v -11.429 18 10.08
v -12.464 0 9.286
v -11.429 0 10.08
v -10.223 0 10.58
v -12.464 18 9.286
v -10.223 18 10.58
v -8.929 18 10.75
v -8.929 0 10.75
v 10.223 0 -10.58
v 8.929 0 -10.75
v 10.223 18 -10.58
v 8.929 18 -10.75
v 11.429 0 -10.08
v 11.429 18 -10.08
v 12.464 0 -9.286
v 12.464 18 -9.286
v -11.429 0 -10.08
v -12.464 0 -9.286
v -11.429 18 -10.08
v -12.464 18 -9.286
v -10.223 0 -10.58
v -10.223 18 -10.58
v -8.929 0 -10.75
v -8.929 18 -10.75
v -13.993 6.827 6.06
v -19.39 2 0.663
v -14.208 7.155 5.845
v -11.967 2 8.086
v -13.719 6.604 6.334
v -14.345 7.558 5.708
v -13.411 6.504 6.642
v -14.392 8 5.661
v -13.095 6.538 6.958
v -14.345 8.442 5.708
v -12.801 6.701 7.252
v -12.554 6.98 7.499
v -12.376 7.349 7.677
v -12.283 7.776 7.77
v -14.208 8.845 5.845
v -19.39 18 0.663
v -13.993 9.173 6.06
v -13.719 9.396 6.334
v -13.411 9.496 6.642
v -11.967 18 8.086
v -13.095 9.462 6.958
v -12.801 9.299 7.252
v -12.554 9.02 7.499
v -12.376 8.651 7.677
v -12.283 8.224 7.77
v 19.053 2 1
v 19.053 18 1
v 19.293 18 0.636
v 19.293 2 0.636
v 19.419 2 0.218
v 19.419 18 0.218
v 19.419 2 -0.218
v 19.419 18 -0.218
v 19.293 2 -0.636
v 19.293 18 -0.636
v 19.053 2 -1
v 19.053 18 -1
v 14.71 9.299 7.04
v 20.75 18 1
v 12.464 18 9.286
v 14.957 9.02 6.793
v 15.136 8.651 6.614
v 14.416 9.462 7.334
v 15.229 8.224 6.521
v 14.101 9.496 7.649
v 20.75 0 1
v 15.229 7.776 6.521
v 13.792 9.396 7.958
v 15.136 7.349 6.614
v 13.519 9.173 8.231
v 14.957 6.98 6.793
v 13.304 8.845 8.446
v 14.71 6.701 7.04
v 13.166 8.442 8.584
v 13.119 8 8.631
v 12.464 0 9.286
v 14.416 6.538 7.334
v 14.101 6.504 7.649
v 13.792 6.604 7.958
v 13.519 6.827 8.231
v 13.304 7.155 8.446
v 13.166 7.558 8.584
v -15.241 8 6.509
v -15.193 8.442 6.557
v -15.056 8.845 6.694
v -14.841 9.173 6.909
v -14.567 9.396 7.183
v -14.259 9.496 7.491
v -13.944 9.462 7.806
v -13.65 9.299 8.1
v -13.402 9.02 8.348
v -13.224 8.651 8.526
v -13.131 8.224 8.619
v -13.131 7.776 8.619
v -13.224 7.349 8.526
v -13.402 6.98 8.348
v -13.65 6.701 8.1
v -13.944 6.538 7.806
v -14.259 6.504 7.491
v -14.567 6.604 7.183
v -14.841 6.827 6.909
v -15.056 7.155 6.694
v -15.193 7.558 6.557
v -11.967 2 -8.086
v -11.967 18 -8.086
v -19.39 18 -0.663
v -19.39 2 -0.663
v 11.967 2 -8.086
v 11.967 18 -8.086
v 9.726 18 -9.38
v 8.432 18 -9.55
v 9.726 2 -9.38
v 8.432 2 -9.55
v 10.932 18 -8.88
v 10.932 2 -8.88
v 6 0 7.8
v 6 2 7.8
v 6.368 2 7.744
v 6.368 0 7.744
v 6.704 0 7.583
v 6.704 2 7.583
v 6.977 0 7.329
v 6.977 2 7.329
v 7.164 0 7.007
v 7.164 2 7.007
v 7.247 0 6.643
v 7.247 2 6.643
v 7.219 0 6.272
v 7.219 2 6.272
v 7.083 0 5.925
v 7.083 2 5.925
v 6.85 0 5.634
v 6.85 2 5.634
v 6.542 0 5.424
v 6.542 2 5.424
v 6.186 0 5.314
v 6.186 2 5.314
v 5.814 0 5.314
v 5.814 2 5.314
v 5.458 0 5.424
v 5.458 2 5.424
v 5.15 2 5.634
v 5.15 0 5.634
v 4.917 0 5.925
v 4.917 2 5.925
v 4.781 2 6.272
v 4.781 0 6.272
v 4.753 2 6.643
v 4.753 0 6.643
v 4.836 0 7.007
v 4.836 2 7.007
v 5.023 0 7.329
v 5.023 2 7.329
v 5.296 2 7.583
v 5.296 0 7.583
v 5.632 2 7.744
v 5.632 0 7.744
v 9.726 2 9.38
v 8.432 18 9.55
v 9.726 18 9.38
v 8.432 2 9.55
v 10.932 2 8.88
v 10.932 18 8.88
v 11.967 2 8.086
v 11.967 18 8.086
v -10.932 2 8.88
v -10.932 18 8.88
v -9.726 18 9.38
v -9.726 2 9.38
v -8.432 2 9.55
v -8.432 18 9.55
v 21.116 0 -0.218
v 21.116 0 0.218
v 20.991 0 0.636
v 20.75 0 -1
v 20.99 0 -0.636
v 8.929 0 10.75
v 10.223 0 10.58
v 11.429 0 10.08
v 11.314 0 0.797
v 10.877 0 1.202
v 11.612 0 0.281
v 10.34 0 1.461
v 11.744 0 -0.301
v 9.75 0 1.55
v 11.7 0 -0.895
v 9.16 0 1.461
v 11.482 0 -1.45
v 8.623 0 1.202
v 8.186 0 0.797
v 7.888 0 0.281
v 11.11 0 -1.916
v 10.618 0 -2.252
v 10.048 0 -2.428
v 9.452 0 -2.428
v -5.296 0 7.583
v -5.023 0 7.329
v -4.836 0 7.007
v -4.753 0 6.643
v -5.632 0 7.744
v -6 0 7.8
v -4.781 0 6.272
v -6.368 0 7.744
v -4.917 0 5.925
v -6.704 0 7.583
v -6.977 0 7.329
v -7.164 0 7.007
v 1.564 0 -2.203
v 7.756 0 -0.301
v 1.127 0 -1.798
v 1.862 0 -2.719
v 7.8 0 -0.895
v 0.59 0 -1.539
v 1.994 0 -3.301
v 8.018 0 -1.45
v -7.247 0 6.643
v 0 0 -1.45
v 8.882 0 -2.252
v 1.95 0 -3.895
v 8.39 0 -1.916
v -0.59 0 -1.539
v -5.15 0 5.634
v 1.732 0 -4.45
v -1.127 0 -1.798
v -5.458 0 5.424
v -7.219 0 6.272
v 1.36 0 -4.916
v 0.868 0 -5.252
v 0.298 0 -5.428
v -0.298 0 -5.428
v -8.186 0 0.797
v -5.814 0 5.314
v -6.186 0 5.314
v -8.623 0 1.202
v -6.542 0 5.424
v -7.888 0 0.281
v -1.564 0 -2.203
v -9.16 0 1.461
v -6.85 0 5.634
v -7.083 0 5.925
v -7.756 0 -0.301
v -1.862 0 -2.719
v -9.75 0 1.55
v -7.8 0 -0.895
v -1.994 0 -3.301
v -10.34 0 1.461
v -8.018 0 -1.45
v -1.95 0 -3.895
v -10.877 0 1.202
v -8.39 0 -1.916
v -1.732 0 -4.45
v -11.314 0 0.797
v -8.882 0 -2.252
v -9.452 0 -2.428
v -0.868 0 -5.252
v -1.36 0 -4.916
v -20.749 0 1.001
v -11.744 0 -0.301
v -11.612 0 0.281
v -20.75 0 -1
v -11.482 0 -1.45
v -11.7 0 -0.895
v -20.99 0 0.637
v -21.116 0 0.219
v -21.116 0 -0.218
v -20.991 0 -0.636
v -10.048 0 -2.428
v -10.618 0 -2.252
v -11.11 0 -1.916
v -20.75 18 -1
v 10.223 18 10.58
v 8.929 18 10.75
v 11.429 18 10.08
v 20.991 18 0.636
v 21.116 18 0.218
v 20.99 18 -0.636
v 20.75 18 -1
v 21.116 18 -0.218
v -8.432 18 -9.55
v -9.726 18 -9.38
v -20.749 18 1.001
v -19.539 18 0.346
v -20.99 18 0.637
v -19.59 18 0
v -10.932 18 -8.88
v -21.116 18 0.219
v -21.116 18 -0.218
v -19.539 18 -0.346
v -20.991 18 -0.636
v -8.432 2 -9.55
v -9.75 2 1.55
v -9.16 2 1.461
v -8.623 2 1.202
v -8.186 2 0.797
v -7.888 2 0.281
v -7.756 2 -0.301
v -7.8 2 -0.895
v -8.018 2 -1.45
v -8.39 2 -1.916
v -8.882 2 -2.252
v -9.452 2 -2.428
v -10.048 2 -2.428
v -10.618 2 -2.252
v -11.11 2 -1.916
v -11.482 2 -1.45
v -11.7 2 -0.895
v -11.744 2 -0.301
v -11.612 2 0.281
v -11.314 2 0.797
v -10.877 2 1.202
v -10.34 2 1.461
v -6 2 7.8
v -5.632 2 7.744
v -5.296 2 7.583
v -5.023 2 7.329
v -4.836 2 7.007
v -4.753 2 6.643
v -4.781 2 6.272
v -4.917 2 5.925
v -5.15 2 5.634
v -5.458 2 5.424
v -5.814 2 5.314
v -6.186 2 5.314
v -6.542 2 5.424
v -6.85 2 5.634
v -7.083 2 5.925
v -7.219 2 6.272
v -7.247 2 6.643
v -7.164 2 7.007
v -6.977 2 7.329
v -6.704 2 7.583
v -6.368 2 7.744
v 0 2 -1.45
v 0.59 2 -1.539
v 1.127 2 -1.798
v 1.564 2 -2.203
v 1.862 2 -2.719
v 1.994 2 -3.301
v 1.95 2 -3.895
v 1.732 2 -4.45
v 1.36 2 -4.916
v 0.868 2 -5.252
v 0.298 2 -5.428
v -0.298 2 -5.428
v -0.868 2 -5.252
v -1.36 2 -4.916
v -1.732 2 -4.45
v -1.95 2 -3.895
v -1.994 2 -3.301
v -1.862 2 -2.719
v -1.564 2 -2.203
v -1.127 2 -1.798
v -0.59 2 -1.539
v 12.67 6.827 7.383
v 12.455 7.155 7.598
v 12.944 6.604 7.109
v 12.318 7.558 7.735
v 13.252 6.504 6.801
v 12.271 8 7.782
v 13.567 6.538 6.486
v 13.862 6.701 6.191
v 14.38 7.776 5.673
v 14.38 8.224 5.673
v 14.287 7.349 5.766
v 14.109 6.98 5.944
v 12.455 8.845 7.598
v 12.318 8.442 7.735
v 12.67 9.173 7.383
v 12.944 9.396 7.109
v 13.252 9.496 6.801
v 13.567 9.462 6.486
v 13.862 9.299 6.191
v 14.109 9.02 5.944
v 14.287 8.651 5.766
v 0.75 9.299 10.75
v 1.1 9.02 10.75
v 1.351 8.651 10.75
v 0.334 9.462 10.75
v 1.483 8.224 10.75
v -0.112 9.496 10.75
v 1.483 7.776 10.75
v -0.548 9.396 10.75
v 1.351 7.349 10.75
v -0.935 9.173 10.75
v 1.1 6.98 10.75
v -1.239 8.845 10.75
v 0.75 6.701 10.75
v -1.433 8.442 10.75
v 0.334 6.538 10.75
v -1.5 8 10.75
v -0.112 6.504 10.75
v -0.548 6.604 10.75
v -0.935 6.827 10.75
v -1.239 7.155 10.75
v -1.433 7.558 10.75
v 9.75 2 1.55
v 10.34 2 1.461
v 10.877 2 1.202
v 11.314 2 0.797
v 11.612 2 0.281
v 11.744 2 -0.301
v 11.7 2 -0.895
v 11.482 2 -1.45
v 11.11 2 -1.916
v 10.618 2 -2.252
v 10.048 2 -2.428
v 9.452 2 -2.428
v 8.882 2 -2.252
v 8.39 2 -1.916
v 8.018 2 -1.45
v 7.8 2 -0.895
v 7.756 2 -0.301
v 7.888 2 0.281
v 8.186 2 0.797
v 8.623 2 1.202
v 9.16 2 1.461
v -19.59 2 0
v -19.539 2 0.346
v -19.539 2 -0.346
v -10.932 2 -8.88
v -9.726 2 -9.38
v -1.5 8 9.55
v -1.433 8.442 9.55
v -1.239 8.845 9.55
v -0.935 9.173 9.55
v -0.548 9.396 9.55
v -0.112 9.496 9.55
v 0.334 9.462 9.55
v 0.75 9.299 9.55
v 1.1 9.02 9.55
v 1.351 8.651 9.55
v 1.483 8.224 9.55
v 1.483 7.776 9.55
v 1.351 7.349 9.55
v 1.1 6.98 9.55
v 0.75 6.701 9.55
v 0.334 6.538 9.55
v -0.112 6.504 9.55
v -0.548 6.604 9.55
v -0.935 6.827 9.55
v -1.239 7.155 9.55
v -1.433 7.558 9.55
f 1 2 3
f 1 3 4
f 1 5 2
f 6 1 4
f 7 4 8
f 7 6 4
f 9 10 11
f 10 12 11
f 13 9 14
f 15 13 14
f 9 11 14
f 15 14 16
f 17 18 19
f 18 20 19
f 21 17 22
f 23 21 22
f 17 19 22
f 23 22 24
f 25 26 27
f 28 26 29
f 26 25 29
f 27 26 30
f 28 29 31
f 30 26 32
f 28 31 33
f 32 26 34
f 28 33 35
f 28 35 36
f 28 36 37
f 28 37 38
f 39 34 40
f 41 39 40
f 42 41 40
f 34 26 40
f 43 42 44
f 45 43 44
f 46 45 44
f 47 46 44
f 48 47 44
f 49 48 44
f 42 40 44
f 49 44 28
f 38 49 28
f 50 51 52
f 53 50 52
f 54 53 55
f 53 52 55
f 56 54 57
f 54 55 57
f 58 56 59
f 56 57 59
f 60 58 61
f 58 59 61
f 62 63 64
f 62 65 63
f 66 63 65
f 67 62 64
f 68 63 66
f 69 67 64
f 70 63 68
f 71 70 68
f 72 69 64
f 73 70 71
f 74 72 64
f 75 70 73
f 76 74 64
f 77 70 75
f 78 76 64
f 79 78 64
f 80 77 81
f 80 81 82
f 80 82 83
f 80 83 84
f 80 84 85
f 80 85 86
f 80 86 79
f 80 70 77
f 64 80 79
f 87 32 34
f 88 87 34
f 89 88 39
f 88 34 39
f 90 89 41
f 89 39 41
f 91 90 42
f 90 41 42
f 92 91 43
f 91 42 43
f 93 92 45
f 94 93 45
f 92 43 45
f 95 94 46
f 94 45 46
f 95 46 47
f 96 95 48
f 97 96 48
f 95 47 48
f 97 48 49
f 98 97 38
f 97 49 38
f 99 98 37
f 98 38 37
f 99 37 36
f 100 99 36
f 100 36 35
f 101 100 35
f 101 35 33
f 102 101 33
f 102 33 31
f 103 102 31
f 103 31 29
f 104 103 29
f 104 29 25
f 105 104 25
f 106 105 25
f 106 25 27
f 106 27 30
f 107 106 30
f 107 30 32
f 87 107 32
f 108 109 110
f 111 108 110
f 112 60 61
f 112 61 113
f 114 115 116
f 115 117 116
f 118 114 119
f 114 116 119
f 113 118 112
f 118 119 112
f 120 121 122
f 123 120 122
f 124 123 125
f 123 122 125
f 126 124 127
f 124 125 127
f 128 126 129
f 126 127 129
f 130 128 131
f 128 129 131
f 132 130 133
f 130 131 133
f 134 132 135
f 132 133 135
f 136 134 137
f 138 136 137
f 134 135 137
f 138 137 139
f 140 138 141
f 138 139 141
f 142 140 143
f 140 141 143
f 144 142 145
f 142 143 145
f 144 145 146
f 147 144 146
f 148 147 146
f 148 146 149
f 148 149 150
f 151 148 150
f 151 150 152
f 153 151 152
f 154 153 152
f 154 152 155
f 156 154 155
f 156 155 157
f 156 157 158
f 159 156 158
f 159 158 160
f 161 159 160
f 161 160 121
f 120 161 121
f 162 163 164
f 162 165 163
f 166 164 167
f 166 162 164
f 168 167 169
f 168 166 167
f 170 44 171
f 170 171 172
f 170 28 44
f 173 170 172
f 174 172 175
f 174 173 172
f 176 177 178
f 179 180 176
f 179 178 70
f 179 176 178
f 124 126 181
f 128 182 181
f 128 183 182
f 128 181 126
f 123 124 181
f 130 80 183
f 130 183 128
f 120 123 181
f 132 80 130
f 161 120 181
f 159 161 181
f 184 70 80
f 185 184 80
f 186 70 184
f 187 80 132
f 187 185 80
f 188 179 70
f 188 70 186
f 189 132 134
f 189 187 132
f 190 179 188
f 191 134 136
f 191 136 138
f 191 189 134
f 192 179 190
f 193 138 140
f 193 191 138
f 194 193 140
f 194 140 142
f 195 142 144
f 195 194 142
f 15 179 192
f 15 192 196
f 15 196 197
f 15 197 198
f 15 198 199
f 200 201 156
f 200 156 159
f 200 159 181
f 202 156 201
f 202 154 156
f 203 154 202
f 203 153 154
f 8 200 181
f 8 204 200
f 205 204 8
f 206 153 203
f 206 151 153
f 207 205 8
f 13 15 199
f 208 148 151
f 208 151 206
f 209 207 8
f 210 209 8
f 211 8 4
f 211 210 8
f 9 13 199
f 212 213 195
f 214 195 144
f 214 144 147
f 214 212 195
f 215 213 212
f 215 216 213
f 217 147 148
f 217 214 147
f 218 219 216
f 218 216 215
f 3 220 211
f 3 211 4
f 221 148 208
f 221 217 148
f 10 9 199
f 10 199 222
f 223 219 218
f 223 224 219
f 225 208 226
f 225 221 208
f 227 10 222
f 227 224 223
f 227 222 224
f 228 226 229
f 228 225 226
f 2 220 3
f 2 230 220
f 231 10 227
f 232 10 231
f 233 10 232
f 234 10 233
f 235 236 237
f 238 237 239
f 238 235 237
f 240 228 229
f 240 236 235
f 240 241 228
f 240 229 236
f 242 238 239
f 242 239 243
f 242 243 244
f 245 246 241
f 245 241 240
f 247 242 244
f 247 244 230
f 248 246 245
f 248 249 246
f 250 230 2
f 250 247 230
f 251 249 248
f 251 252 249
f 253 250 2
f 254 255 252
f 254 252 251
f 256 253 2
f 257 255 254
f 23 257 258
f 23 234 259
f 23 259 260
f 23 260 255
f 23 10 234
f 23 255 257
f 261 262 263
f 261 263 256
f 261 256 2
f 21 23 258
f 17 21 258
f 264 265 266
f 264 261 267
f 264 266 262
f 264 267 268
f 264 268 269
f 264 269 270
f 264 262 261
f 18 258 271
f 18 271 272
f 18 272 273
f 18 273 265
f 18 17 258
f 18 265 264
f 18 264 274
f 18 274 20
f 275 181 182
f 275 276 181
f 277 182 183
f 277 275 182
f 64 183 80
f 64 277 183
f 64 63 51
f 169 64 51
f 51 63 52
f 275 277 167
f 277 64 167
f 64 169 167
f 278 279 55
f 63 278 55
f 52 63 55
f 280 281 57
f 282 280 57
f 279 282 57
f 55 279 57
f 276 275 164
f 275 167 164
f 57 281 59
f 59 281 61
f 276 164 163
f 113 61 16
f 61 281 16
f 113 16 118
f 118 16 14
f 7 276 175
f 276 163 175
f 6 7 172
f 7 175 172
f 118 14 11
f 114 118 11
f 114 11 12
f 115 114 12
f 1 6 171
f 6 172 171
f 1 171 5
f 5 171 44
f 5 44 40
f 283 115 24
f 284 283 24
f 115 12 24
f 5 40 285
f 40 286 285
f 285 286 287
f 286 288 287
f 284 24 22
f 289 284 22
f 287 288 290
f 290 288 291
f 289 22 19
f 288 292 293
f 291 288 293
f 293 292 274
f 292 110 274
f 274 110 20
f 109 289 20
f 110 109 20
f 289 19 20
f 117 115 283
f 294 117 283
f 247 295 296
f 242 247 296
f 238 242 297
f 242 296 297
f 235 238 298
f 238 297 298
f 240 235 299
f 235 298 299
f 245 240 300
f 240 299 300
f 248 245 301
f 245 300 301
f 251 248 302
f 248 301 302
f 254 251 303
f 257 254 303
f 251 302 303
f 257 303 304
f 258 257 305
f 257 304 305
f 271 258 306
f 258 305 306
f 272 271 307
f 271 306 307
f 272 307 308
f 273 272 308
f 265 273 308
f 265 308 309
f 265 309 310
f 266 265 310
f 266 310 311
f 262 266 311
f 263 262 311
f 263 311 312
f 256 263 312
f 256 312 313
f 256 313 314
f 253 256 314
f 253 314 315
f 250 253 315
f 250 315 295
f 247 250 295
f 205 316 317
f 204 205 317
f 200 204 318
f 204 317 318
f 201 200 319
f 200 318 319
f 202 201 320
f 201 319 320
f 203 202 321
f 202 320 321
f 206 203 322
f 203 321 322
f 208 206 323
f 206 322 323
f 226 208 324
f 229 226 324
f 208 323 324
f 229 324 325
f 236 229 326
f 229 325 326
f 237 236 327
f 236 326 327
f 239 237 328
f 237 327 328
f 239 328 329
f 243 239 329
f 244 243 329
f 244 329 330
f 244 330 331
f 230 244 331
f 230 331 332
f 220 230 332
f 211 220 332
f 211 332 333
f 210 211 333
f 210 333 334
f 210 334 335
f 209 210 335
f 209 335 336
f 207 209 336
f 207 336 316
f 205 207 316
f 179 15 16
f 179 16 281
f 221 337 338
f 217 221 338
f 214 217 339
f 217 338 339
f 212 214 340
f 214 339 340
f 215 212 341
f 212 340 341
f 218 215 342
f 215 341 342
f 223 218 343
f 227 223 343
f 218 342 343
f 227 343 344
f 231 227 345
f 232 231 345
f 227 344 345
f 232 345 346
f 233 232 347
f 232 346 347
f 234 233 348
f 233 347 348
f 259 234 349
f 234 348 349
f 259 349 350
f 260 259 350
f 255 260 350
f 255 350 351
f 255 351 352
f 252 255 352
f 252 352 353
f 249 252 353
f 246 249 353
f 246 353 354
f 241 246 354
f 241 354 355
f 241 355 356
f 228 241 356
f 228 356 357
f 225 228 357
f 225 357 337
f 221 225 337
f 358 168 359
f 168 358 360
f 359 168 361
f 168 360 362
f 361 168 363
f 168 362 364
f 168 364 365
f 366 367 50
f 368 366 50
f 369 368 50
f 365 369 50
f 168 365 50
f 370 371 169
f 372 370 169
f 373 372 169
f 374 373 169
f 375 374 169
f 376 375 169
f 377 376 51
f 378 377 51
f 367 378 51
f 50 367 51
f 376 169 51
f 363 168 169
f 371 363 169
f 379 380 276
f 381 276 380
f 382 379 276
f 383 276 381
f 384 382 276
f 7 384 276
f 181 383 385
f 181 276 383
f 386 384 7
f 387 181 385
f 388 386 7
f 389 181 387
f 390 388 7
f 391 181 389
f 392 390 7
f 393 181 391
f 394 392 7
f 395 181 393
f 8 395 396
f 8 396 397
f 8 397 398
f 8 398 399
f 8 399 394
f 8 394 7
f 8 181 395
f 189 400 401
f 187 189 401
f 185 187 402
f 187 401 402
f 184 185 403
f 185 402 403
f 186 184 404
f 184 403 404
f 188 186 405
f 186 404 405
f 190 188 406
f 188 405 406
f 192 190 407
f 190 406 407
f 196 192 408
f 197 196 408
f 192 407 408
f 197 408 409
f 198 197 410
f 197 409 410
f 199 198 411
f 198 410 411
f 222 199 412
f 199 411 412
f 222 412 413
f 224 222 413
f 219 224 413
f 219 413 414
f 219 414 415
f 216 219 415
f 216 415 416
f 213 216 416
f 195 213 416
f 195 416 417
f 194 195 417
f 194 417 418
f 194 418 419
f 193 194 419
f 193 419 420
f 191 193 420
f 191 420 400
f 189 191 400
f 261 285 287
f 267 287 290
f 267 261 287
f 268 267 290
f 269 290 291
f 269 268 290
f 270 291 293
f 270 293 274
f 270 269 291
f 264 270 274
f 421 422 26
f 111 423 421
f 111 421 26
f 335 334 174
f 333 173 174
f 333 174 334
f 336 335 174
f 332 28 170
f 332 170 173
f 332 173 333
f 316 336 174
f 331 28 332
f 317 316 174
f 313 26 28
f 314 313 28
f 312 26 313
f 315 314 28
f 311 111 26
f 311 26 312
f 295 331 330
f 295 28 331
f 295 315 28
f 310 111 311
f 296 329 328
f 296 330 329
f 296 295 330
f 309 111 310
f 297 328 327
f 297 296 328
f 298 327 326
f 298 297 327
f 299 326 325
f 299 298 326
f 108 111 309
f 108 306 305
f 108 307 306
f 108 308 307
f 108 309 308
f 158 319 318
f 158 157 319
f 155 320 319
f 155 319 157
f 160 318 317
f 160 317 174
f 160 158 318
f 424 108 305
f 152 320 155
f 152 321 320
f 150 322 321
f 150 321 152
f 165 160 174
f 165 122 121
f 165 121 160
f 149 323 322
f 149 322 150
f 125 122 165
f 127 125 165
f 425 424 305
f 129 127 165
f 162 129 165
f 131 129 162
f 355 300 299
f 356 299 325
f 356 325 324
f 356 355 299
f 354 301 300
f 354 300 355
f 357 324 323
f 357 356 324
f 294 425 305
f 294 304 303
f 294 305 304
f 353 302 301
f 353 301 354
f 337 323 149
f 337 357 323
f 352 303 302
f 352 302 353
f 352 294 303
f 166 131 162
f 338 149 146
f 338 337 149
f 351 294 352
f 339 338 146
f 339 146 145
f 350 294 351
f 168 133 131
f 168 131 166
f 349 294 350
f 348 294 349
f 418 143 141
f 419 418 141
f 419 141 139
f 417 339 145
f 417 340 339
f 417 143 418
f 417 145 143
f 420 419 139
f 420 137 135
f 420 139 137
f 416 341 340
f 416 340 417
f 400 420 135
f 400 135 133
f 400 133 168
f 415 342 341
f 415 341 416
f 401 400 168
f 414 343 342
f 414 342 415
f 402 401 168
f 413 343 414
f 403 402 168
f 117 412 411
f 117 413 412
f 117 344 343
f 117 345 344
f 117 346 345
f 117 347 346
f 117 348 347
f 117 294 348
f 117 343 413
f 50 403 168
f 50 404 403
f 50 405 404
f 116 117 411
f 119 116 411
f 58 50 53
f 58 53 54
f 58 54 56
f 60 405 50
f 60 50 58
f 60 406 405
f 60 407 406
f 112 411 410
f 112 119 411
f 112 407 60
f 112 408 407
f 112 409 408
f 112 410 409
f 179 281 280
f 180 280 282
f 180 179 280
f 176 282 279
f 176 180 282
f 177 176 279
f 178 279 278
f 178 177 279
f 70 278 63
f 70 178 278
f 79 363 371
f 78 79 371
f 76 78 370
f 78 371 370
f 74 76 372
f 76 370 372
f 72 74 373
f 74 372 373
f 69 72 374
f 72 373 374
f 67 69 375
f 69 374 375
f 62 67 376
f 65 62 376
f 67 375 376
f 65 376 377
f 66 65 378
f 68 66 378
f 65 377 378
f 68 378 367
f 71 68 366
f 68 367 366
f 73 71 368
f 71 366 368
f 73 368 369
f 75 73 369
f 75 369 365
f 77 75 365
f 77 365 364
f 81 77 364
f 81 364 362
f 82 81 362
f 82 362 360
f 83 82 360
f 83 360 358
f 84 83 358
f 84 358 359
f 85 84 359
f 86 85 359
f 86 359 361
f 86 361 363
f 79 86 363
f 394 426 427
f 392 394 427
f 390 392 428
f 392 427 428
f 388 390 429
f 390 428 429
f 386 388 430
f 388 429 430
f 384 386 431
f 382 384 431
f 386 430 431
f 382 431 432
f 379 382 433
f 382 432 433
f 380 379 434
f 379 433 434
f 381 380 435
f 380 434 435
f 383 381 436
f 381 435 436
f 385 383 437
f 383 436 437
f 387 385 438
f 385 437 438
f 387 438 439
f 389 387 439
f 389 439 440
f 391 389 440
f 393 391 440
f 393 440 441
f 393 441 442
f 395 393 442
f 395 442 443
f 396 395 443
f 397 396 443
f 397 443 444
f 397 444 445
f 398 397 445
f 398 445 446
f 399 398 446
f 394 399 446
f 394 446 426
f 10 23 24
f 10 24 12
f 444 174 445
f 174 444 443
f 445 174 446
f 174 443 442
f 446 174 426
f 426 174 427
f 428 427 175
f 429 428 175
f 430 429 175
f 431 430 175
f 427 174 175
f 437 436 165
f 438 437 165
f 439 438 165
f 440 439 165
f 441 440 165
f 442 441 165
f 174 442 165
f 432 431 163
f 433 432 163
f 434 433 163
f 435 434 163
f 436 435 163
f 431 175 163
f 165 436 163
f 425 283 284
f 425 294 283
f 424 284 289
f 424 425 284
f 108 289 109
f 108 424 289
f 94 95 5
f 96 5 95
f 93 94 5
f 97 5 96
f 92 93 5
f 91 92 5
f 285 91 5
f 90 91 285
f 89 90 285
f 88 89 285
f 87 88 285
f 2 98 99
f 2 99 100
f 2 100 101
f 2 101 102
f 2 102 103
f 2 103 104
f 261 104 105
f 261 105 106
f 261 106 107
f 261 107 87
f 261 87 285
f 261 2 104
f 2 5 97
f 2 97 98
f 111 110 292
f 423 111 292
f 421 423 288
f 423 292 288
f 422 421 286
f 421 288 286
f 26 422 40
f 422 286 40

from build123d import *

# Parameters (mm, degrees)
RESSALTO_EXTRUS_O1_DEPTH = 18
CORTE_EXTRUS_O1_DEPTH    = 16
ESBO_O3_R                = 1.5
CORTE_EXTRUS_O2_DEPTH    = 16
ESBO_O4_R                = 1.5
CORTE_EXTRUS_O5_DEPTH    = 5
ESBO_O11_R               = 1.5
CORTE_EXTRUS_O6_DEPTH    = 5
ESBO_O16_R               = 2
CORTE_EXTRUS_O7_DEPTH    = 5
ESBO_O17_R               = 1.25
CORTE_EXTRUS_O8_DEPTH    = 10
FILETE1_R                = 5
FILETE2_R                = 5
FILETE3_R                = 5
FILETE4_R                = 5
FILETE5_R                = 5
FILETE6_R                = 5
FILETE7_R                = 5
FILETE8_R                = 5


with BuildPart() as part:
    # Esboço1 → Ressalto-extrusão1 (new body)
    with BuildSketch(Plane(origin=(0, 0, 0), x_dir=(1, 0, 0), z_dir=(0, 1, 0))):
        with BuildLine():
            ThreePointArc((-20.749133867, -1.000866133), (-21.131951371, -0.000598593), (-20.75, 1))
            Line((-20.75, 1), (-11, 10.75))
            Line((-11, 10.75), (11, 10.75))
            Line((11, 10.75), (20.75, 1))
            ThreePointArc((20.75, 1), (21.131966011, 0), (20.750111133, -0.999888867))
            Line((20.750111133, -0.999888867), (11, -10.75))
            Line((11, -10.75), (-11, -10.75))
            Line((-11, -10.75), (-20.749133867, -1.000866133))
        make_face()
    extrude(amount=RESSALTO_EXTRUS_O1_DEPTH)

    # Esboço2 → Corte-extrusão1 (cut)
    with BuildSketch(Plane(origin=(0, 18, 0), x_dir=(1, 0, 0), z_dir=(0, 1, 0))):
        with BuildLine():
            Line((9.972089297, 9.55), (-10.502943725, 9.55))
            Line((-10.502943725, 9.55), (-19.052943725, 1))
            Line((-19.052943725, 1), (-19.389618767, 0.663324958))
            ThreePointArc((-19.389618767, 0.663324958), (-19.589618767, 0), (-19.389618767, -0.663324958))
            Line((-19.389618767, -0.663324958), (-19.052943725, -1))
            Line((-19.052943725, -1), (-10.502943725, -9.55))
            Line((-10.502943725, -9.55), (10.502943725, -9.55))
            Line((10.502943725, -9.55), (19.052943725, -1))
            ThreePointArc((19.052943725, -1), (19.434909736, 0), (19.052943725, 1))
            Line((19.052943725, 1), (11.538307765, 8.51463596))
            Line((11.538307765, 8.51463596), (10.502943725, 9.55))
            Line((10.502943725, 9.55), (9.972089297, 9.55))
        make_face()
    extrude(amount=-CORTE_EXTRUS_O1_DEPTH, mode=Mode.SUBTRACT)

    # Esboço3 → Corte-extrusão2 (cut)
    with BuildSketch(Plane(origin=(0, 0, 9.55), x_dir=(-1, 0, 0), z_dir=(0, 0, -1))):
        with Locations((0, 8)):
            Circle(ESBO_O3_R)
    extrude(amount=-CORTE_EXTRUS_O2_DEPTH, mode=Mode.SUBTRACT)

    # Esboço4 → Corte-extrusão5 (cut)
    with BuildSketch(Plane(origin=(10.026471863, 0, 10.026471863), x_dir=(-0.7071067811865475, 0, 0.7071067811865477), z_dir=(-0.7071067811865477, 0, -0.7071067811865475))):
        with Locations((-4.67383297, 8)):
            Circle(ESBO_O4_R)
    extrude(amount=-CORTE_EXTRUS_O5_DEPTH, mode=Mode.SUBTRACT)

    # Esboço11 → Corte-extrusão6 (cut)
    with BuildSketch(Plane(origin=(-10.026471863, 0, 10.026471863), x_dir=(-0.7071067811865477, 0, -0.7071067811865474), z_dir=(0.7071067811865474, 0, -0.7071067811865477))):
        with Locations((4.67383297, 8)):
            Circle(ESBO_O11_R)
    extrude(amount=-CORTE_EXTRUS_O6_DEPTH, mode=Mode.SUBTRACT)

    # Esboço16 → Corte-extrusão7 (cut)
    with BuildSketch(Plane(origin=(0, 2, 0), x_dir=(1, 0, 0), z_dir=(0, 1, 0))):
        with Locations(Location((-9.75, 0.45, 0), (0, 0, 270))):
            Circle(ESBO_O16_R)
        with Locations(Location((9.75, 0.45, 0), (0, 0, 270))):
            Circle(ESBO_O16_R)
        with Locations(Location((0, 3.45, 0), (0, 0, 270))):
            Circle(ESBO_O16_R)
    extrude(amount=-CORTE_EXTRUS_O7_DEPTH, mode=Mode.SUBTRACT)

    # Esboço17 → Corte-extrusão8 (cut)
    with BuildSketch(Plane(origin=(0, 2, 0), x_dir=(1, 0, 0), z_dir=(0, 1, 0))):
        with Locations(Location((-6, -6.55, 0), (0, 0, 270))):
            Circle(ESBO_O17_R)
        with Locations(Location((6, -6.55, 0), (0, 0, 270))):
            Circle(ESBO_O17_R)
    extrude(amount=-CORTE_EXTRUS_O8_DEPTH, mode=Mode.SUBTRACT)

    # Filete1
    filete1_edges = [part.edges().sort_by_distance(p)[0] for p in [
        (-10.502943725, 10, -9.55),
    ]]
    fillet(filete1_edges, radius=FILETE1_R)

    # Filete2
    filete2_edges = [part.edges().sort_by_distance(p)[0] for p in [
        (10.502943725, 10, -9.55),
    ]]
    fillet(filete2_edges, radius=FILETE2_R)

    # Filete3
    filete3_edges = [part.edges().sort_by_distance(p)[0] for p in [
        (-10.502943725, 10, 9.55),
    ]]
    fillet(filete3_edges, radius=FILETE3_R)

    # Filete4
    filete4_edges = [part.edges().sort_by_distance(p)[0] for p in [
        (10.502943725, 10, 9.55),
    ]]
    fillet(filete4_edges, radius=FILETE4_R)

    # Filete5
    filete5_edges = [part.edges().sort_by_distance(p)[0] for p in [
        (-11, 9, -10.75),
    ]]
    fillet(filete5_edges, radius=FILETE5_R)

    # Filete6
    filete6_edges = [part.edges().sort_by_distance(p)[0] for p in [
        (11, 9, -10.75),
    ]]
    fillet(filete6_edges, radius=FILETE6_R)

    # Filete7
    filete7_edges = [part.edges().sort_by_distance(p)[0] for p in [
        (-11, 9, 10.75),
    ]]
    fillet(filete7_edges, radius=FILETE7_R)

    # Filete8
    filete8_edges = [part.edges().sort_by_distance(p)[0] for p in [
        (11, 9, 10.75),
    ]]
    fillet(filete8_edges, radius=FILETE8_R)


solid = part.part
